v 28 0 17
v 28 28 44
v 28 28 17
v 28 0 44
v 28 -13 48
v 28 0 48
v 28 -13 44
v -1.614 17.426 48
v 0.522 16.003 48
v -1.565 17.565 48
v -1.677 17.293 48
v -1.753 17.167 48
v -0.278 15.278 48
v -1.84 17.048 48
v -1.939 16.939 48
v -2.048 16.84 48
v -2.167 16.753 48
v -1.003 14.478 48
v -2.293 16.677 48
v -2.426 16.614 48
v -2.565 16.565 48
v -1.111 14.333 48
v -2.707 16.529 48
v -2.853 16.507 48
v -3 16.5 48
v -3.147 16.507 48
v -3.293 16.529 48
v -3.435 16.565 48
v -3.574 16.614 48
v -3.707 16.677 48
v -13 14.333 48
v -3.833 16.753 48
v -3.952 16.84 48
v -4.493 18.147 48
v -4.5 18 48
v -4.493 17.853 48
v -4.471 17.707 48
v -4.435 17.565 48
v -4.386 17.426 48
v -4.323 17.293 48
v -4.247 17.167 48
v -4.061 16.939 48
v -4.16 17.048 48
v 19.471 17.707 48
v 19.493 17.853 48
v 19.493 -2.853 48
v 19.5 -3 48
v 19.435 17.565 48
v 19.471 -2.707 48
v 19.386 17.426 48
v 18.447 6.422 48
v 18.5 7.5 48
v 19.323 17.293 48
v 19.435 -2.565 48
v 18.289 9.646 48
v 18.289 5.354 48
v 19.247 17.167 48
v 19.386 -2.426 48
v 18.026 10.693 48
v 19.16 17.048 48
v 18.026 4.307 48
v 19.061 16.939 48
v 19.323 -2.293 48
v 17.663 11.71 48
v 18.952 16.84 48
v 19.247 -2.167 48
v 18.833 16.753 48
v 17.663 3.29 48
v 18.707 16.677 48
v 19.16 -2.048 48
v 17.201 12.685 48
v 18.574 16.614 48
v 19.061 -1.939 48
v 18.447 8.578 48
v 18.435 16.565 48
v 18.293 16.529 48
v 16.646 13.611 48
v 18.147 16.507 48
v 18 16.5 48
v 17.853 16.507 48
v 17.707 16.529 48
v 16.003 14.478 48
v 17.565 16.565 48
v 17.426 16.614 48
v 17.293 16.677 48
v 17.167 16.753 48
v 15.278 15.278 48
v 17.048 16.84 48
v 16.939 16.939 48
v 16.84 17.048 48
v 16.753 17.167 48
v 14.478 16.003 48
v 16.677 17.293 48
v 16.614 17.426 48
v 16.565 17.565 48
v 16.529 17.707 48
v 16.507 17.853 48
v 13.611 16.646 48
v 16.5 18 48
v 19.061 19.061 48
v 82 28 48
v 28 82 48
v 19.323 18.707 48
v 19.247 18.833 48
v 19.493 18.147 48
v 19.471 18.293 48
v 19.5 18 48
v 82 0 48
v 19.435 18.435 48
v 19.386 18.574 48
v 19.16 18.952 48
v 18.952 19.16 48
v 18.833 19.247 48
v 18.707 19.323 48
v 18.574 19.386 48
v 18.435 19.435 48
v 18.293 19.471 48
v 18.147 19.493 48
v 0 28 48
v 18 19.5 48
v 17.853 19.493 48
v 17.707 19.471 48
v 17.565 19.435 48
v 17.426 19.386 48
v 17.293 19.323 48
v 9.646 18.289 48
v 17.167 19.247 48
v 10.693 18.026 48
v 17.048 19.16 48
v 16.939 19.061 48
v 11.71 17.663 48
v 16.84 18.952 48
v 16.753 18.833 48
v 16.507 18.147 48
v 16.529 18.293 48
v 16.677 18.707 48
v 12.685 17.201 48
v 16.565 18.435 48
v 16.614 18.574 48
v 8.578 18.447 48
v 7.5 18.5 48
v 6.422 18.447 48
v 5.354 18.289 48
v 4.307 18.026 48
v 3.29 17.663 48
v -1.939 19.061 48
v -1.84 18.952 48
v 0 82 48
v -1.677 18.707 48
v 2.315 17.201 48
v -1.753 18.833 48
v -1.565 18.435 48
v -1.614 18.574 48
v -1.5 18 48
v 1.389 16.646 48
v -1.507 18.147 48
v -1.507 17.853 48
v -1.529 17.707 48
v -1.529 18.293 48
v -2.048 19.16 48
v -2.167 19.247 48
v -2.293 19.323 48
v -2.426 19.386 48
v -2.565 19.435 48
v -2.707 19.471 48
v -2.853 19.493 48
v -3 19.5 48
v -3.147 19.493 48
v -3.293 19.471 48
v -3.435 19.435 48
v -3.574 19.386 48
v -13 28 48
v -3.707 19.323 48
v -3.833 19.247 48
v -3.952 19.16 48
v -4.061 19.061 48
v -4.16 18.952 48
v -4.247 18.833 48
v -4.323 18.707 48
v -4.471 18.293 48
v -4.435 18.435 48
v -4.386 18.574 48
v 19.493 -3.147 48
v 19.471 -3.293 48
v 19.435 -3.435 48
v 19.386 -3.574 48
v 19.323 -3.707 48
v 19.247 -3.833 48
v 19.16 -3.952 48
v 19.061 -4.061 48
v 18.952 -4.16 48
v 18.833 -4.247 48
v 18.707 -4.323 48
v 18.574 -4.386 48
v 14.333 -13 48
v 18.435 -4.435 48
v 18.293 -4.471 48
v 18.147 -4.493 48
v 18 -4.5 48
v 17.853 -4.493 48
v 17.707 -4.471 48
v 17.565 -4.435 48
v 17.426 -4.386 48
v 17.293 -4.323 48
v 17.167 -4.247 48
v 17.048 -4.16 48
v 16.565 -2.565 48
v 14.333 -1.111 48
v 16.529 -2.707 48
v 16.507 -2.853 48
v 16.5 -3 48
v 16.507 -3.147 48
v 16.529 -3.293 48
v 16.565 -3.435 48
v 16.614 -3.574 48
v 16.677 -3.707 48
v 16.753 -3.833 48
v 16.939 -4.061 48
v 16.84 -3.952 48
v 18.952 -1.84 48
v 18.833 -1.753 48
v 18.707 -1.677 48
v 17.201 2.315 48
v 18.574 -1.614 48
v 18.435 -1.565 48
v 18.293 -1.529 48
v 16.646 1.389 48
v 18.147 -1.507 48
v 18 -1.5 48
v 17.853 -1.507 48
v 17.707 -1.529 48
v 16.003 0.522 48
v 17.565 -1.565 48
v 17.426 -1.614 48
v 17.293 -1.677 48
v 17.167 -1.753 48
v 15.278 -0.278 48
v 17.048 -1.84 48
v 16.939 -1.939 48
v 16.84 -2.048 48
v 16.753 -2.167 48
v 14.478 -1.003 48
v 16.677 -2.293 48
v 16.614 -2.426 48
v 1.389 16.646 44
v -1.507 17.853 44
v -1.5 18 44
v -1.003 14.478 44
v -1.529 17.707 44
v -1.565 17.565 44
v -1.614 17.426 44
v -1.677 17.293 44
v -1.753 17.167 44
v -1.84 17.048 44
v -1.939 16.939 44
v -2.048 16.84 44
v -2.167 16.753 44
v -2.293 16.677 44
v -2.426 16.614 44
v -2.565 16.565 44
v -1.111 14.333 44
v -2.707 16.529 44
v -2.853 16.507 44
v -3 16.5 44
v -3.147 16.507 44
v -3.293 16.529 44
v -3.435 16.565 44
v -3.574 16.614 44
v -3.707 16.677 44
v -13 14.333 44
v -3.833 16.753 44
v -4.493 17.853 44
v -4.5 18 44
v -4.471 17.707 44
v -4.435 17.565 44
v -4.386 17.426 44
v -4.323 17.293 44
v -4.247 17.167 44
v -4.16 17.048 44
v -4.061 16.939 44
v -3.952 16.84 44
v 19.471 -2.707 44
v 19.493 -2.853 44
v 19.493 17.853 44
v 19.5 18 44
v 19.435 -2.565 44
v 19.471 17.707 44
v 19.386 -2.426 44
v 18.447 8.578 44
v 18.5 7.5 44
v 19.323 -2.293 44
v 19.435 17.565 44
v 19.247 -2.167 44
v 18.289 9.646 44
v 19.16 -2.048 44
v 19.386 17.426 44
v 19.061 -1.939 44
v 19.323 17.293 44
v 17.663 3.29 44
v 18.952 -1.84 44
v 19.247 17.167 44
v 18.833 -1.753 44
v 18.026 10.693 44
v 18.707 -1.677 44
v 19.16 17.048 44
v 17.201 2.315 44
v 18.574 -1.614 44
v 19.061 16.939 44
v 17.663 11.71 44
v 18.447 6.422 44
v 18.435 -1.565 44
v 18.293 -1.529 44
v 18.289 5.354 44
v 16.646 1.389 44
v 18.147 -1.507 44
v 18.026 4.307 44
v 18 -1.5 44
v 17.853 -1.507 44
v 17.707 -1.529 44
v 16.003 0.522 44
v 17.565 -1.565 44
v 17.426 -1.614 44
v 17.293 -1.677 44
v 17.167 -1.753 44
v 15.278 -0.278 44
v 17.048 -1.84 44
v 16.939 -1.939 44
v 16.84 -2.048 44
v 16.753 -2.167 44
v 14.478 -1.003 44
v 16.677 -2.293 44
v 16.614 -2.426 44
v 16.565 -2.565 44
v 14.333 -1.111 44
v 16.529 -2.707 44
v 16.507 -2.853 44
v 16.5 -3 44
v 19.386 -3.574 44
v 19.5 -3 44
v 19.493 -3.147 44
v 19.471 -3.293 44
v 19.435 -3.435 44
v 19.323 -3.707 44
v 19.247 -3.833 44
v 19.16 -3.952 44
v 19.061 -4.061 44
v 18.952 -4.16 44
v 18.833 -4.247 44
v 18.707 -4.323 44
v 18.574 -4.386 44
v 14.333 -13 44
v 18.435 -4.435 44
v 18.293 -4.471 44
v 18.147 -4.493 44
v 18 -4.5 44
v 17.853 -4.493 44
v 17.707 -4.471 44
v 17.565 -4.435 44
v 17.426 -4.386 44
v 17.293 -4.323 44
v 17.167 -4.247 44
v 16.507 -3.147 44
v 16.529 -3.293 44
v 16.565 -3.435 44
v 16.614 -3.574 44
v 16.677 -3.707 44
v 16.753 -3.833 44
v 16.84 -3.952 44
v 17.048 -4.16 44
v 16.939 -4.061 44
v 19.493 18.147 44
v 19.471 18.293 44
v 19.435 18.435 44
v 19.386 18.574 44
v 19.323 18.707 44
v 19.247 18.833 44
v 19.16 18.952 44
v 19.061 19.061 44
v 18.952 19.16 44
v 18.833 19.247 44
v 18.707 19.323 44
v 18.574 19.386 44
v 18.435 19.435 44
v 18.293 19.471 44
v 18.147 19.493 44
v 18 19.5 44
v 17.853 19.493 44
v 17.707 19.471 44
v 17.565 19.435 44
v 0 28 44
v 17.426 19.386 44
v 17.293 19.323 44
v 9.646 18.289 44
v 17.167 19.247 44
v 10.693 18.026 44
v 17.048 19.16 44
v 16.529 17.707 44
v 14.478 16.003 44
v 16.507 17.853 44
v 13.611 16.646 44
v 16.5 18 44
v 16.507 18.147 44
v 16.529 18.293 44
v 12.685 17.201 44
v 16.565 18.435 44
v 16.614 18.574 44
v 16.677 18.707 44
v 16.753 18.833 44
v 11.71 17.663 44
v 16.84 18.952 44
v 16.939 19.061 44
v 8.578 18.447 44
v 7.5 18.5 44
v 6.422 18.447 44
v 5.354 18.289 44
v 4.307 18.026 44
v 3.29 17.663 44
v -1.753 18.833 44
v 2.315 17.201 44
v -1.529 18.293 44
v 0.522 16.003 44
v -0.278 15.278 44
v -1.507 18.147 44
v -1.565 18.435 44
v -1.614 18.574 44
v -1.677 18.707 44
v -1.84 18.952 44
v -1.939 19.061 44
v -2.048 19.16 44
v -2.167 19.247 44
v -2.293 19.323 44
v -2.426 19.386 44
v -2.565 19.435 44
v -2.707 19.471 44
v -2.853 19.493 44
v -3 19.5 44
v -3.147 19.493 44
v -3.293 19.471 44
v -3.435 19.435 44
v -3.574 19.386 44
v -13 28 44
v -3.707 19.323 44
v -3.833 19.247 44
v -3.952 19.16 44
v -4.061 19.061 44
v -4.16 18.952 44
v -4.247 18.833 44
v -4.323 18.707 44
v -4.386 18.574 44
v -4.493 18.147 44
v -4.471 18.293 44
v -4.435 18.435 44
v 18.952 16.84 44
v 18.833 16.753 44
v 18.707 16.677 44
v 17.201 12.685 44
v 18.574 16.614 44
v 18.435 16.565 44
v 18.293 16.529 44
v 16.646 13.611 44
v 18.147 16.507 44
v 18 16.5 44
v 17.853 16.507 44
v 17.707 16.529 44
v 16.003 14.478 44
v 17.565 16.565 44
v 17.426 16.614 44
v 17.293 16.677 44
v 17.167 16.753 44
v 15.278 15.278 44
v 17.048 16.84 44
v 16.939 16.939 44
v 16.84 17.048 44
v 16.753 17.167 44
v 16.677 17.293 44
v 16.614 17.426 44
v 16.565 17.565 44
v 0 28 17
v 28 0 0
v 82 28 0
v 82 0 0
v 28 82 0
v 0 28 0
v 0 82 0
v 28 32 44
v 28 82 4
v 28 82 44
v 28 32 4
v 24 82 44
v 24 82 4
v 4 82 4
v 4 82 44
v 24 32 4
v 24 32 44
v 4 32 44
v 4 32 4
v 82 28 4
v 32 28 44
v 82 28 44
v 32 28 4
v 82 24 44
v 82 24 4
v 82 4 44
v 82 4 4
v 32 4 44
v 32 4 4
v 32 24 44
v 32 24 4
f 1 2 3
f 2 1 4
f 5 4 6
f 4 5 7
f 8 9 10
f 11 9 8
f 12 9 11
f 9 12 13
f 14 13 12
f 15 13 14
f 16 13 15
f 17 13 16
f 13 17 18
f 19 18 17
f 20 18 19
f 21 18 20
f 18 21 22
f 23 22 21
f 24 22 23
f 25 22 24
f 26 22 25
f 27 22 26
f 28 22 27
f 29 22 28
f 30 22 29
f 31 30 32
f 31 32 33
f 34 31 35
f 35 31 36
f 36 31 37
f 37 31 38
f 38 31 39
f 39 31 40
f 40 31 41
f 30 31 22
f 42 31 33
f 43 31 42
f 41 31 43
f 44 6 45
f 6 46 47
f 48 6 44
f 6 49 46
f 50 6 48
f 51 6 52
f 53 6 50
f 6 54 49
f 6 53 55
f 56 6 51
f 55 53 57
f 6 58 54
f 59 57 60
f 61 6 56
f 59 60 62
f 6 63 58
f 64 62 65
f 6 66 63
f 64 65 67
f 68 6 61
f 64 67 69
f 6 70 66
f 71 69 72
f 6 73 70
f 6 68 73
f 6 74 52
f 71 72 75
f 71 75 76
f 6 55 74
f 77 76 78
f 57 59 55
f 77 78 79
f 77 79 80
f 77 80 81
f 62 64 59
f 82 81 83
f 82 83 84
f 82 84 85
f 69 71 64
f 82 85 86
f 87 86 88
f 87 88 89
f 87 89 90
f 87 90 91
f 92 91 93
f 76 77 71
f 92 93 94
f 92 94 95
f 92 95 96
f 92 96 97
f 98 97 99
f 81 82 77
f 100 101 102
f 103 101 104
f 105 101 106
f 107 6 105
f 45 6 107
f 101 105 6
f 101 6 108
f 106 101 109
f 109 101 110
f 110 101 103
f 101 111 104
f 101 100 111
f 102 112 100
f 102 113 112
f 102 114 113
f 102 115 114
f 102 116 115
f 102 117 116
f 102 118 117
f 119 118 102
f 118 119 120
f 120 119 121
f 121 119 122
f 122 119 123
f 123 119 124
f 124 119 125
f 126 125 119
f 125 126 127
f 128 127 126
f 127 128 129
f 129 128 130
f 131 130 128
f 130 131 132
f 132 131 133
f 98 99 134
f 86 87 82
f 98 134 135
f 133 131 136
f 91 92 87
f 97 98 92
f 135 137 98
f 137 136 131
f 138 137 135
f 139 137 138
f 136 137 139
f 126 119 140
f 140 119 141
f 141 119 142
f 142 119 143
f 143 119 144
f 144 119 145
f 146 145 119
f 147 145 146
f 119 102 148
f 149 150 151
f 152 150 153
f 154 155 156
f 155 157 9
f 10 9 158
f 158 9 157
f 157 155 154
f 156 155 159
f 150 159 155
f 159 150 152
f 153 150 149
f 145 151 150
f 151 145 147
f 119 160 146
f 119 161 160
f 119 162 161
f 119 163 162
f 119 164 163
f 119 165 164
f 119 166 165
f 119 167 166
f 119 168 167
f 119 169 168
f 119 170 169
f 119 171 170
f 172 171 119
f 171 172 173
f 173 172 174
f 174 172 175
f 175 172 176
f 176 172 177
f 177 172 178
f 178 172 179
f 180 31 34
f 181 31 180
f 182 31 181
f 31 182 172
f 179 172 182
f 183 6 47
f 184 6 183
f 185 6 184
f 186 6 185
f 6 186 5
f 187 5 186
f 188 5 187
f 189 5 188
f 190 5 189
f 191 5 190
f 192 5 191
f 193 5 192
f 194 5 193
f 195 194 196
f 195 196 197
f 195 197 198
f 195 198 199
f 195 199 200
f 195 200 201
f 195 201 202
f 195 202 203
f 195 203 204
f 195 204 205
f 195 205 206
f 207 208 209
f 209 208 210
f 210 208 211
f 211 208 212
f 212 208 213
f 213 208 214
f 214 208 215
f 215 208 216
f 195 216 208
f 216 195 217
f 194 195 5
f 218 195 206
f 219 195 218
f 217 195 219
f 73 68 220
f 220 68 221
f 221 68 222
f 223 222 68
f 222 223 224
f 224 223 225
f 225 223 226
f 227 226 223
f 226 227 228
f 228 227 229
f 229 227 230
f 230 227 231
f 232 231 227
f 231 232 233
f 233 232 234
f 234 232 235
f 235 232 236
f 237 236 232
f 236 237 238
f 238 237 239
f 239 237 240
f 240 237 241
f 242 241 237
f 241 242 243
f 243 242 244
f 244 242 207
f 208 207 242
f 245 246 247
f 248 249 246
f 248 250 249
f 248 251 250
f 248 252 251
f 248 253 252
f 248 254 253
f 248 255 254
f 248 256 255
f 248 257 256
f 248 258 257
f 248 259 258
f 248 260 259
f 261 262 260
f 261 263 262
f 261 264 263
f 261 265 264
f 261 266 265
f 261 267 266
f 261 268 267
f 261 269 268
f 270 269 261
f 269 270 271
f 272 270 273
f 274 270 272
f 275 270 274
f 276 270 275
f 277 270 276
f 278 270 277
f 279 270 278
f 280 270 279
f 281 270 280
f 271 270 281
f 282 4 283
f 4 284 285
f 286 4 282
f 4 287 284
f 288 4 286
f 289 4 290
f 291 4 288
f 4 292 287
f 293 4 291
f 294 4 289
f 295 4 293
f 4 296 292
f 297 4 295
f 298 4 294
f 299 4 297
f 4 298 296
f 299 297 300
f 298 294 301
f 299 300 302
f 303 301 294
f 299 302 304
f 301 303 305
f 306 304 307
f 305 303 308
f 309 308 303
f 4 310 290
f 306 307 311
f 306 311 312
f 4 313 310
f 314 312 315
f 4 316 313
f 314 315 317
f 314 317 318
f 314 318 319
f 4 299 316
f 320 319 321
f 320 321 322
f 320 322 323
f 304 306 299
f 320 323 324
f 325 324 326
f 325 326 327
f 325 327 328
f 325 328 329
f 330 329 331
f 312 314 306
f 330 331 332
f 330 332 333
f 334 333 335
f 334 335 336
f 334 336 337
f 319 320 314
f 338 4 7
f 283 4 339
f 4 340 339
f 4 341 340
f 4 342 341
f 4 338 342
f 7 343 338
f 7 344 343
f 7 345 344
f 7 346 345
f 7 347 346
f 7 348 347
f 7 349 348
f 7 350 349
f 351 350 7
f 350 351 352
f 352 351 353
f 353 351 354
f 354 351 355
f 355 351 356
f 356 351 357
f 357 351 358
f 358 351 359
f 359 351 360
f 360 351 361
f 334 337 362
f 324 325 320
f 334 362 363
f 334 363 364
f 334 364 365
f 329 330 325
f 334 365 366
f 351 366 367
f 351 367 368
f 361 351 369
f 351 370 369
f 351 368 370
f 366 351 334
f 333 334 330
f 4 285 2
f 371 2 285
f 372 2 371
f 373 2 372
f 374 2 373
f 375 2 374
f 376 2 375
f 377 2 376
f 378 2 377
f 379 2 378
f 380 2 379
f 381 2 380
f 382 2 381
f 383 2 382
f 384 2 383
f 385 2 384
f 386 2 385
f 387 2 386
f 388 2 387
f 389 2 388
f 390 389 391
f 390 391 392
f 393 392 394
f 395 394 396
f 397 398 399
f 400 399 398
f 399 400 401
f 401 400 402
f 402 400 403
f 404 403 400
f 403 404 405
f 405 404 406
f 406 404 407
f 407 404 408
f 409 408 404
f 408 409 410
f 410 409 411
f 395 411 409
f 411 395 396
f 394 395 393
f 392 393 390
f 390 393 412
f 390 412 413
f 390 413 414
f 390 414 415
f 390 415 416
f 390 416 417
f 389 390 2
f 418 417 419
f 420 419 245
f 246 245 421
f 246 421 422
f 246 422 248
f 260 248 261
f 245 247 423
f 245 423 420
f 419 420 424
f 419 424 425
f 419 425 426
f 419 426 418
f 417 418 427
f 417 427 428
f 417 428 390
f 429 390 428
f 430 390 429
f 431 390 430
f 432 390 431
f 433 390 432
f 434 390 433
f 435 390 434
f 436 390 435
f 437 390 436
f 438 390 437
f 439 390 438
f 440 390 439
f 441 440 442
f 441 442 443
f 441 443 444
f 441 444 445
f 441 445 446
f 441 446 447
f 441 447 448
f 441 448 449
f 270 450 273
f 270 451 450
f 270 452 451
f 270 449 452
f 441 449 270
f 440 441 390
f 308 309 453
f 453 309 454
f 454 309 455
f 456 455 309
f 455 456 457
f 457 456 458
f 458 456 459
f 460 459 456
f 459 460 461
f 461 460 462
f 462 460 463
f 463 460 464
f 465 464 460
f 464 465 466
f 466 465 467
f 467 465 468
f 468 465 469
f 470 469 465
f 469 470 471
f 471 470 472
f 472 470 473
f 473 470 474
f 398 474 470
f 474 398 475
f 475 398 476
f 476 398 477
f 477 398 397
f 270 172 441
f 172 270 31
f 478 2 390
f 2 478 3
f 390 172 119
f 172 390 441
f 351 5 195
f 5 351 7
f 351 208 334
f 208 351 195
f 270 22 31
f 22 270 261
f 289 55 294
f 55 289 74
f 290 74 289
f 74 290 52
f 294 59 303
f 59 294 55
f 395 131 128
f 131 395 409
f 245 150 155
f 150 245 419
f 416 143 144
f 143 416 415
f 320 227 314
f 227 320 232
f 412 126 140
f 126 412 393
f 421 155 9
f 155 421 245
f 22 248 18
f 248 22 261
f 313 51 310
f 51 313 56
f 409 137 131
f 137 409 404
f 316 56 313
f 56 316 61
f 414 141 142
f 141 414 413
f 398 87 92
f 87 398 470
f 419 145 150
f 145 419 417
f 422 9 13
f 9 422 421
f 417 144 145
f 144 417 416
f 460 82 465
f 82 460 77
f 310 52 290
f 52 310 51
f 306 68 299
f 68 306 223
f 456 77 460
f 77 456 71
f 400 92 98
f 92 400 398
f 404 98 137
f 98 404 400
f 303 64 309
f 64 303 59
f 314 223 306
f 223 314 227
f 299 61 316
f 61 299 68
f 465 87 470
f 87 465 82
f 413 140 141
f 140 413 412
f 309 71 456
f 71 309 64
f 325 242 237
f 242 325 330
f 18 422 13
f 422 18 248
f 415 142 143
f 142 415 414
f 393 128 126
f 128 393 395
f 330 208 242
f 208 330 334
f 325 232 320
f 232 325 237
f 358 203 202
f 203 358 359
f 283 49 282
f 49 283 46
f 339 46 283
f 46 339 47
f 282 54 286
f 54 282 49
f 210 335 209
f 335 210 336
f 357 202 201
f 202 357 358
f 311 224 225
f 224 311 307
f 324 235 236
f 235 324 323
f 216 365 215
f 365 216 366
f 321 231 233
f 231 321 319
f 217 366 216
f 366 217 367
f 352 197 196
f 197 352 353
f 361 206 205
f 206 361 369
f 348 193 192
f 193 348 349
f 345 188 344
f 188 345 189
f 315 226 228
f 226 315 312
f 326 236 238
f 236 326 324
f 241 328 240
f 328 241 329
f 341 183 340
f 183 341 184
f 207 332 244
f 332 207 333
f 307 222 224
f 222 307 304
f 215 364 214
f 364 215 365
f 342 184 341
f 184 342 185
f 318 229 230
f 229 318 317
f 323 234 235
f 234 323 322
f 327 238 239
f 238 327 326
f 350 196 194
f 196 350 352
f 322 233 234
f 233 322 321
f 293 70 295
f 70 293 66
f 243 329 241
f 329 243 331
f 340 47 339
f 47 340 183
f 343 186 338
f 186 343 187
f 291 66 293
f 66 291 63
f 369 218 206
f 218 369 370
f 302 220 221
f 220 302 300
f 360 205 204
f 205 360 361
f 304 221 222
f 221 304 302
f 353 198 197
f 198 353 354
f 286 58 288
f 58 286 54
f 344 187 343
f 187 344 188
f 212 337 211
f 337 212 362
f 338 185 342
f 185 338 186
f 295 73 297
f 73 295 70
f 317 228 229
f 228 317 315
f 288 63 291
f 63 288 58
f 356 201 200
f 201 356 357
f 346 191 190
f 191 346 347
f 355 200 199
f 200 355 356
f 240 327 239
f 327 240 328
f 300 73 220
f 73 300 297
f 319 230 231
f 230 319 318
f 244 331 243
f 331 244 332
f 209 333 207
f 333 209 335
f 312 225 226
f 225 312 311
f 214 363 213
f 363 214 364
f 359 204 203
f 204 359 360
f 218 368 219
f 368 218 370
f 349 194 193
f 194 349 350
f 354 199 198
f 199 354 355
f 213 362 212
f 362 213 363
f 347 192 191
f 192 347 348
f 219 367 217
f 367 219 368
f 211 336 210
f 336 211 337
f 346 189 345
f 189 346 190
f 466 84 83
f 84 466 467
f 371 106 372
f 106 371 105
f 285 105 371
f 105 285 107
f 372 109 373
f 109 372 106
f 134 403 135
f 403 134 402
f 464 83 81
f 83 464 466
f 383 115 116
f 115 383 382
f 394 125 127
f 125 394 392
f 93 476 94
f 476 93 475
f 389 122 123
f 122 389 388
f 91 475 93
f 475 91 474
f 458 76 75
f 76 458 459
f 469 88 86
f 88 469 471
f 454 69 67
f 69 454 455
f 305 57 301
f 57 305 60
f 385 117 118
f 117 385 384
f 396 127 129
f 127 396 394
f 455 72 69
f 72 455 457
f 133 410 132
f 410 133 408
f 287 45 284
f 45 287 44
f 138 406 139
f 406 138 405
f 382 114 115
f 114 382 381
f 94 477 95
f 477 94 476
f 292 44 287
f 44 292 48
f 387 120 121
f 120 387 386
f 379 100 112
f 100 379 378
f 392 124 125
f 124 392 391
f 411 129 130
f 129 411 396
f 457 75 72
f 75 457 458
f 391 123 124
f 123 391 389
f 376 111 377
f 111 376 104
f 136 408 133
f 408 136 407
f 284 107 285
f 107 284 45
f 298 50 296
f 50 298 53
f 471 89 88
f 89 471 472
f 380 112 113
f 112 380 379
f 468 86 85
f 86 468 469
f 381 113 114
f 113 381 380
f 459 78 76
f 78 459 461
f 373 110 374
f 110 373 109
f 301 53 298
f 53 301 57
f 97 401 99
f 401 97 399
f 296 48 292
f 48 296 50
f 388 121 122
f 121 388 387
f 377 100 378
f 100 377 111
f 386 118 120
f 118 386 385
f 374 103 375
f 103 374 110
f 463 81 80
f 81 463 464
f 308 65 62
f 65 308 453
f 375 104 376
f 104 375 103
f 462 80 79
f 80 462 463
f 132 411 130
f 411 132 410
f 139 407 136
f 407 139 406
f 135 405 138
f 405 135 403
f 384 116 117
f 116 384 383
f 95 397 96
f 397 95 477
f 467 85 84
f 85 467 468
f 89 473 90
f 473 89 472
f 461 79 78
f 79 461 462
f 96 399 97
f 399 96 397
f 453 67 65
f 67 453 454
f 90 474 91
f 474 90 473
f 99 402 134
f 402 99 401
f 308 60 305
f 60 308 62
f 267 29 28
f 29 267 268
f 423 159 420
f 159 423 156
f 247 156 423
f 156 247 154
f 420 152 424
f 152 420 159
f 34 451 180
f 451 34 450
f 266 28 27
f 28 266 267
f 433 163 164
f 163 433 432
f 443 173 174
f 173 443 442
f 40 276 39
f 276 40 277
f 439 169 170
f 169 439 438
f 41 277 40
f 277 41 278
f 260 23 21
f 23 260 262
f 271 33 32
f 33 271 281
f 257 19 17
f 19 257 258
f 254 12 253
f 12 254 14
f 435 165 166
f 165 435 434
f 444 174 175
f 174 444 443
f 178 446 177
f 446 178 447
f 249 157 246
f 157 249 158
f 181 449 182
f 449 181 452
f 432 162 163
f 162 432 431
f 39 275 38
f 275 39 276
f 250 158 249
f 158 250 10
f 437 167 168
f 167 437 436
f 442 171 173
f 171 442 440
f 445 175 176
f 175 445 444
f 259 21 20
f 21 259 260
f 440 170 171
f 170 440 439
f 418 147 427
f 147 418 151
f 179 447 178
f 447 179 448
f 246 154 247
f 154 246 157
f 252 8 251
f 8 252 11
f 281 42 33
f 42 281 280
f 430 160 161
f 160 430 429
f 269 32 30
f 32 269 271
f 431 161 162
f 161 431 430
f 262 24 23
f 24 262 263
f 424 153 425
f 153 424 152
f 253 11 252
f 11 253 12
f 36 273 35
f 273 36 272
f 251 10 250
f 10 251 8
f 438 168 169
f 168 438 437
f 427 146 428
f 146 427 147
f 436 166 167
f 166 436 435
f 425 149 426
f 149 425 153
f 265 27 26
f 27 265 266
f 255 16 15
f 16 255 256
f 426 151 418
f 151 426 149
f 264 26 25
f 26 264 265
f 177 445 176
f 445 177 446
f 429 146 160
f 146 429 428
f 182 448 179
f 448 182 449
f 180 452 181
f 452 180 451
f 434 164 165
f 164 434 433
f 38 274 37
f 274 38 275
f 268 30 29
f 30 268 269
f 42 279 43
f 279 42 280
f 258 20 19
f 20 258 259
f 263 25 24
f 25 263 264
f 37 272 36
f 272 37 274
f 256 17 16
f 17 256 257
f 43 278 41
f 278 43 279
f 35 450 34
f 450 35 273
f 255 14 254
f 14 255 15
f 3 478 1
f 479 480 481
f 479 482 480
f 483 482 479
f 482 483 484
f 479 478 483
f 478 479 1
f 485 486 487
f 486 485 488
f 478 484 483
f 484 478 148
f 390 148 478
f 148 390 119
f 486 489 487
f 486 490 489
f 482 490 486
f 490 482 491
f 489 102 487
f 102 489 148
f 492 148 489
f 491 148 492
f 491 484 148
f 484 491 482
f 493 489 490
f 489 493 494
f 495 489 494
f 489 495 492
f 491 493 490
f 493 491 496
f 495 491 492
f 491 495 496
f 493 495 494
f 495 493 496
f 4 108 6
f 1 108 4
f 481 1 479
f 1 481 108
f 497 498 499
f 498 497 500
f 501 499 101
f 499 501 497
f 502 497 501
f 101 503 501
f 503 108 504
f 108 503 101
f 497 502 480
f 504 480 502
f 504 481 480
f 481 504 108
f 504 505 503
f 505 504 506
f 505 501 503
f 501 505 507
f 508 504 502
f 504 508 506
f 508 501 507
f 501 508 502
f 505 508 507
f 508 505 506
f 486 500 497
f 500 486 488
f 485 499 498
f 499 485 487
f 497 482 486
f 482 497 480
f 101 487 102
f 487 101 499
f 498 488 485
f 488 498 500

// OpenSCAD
// file: variables.scad
//Universal 
$fn= $preview ? 32 : 64;
tolerance = 0.4; //play for EASY fit
wallThickness = 4;
cutOut = 0.2;

//dimention of extrusion aluminium profile
extrusionHeight = 40;
extrusionWidth = 20;
extrusionDepth = 50;

//extrusionSlotMetrics
extrusionSlotOffset = 6.9;
extrusionSlotWidth = 6.2;
extrusionSlotMid = 13.7;

//dimention of extrusion aluminium and walls
outerExtrusionHeight = extrusionHeight+wallThickness*2;
outerExtrusionWidth = extrusionWidth+wallThickness*2;
outerExtrusionDepth = extrusionDepth+wallThickness;

//inner support
frontSupportThickness = extrusionHeight/10;
innerSupportDifference = sqrt(2)*outerExtrusionDepth;

//outer support
outerSupportDifference = sqrt(2)*outerExtrusionWidth;

//stepper Motor
stepperMotorHight = 31;
stepperMotorWidth = 41;
stepperMotorScrewDiameter = 3;
stepperMotorShaftDiameter = 22;
stepperThreadOffset = 10;
stepperMotorMountThickness = 4;
// main file
include <variables.scad>;

module extrusionSleevePrimitive(){
	
	difference(){
		
		cube([outerExtrusionWidth, outerExtrusionDepth, outerExtrusionHeight], false);
		
		translate([wallThickness,wallThickness,wallThickness]){
			
			cube([extrusionWidth, extrusionDepth+cutOut, extrusionHeight], false);
			
		}
		
	}                                               
		
}

module extrusionSleevePair(){
	
	translate([0,outerExtrusionWidth,0]){
		
		extrusionSleevePrimitive();
		
		translate([outerExtrusionWidth,0,0]){
		
			rotate([0,0,-90]){
			
				extrusionSleevePrimitive();
			
			}
			
		}
		
	}
	
}

module jointInnerSupportPrimitive(){
	
	difference(){
                
		union(){
                    
			translate([0,0,0]){   
                        
				cube([outerExtrusionDepth,outerExtrusionDepth,frontSupportThickness],false);
                        
			}
                        
			translate([0,0,outerExtrusionHeight-frontSupportThickness]){
                        
				cube([outerExtrusionDepth,outerExtrusionDepth,frontSupportThickness],false);
					
			}
                        
		}
            
		rotate([0,0,45]){
                    
			translate([0,0,-cutOut/2]){
                        
				cube([innerSupportDifference,innerSupportDifference,outerExtrusionHeight+cutOut],false);
                        
			}
                    
		} 
                
	}
	
	translate([outerExtrusionDepth,0,0]){
        
		rotate([0,0,90]){
			
			difference(){
                
				cube([wallThickness,wallThickness,outerExtrusionHeight],false);
                
				translate([wallThickness,wallThickness,outerExtrusionHeight/2]){
                    
					rotate([0,0,45]){
							
						cube([sqrt(2)*wallThickness,sqrt(2)*wallThickness,outerExtrusionHeight+cutOut],true);
						
					}
				
				}
				
			}
			
		}
		
	}
	
}

module jointInnerSupport(){
	
	translate([outerExtrusionWidth,outerExtrusionWidth+outerExtrusionDepth,0]){
		
		rotate([0,0,-90]){
		
			jointInnerSupportPrimitive();
			
		}
		
	}
	
}

module jointOuterSupportPrimitive(hasStepperMotorCutout){
	
	if (hasStepperMotorCutout==true){
		
		translate([outerExtrusionWidth/2,outerExtrusionWidth/2,outerExtrusionHeight/2-stepperMotorHight/2]){
			
            difference(){
                
                cube([outerExtrusionWidth, outerExtrusionWidth, outerExtrusionHeight-stepperMotorHight], true);

                rotate([0,0,-135]){

                    translate([outerSupportDifference/2, 0, 0]){

                        cube([outerSupportDifference, outerSupportDifference, outerExtrusionHeight+cutOut], true);

                    }

				}

			} 

		}
		
	}
	
	else{
		
		translate([outerExtrusionWidth/2,outerExtrusionWidth/2,outerExtrusionHeight/2]){
			
            difference(){
                
                cube([outerExtrusionWidth, outerExtrusionWidth, outerExtrusionHeight], true);

                rotate([0,0,-135]){

                    translate([outerSupportDifference/2, 0, 0]){

                        cube([outerSupportDifference, outerSupportDifference, outerExtrusionHeight+cutOut], true);
						
					}
					
				}

			} 

		}	
		
	}
	
}

module stepperMountPrimitive(){
	
	difference(){
                
		cube([stepperMotorWidth,stepperMotorWidth,stepperMotorMountThickness],false);
            
		translate([-stepperMotorWidth/3,-stepperMotorWidth/3,-cutOut/2]){
                    
			cube([stepperMotorWidth,stepperMotorWidth,stepperMotorMountThickness+cutOut]);
			
		}
            
		translate([stepperMotorWidth/2,stepperMotorWidth/2,-cutOut/2]){
                    
            cylinder(stepperMotorMountThickness+cutOut,d=stepperMotorShaftDiameter,false);
		
		}
            
		translate([stepperMotorWidth-stepperThreadOffset,stepperMotorWidth-31,0]){
                    
            cylinder(stepperMotorMountThickness+cutOut,d=stepperMotorScrewDiameter,false );
			
		}
                    
        translate([stepperMotorWidth-stepperThreadOffset,stepperMotorWidth-stepperThreadOffset,0]){
			
            cylinder(stepperMotorMountThickness+cutOut,d=stepperMotorScrewDiameter,false);
			
		}
                    
        translate([stepperMotorWidth-31,stepperMotorWidth-stepperThreadOffset,0]){
                    
            cylinder(stepperMotorMountThickness+cutOut,d=stepperMotorScrewDiameter,false);
		}
                    
	}
	
}

module stepperMount();{
	
	translate([-stepperMotorWidth+outerExtrusionWidth,-stepperMotorWidth+outerExtrusionWidth,outerExtrusionHeight-	stepperMotorMountThickness]){
		
		stepperMountPrimitive();
		
	}	
	
}


jointOuterSupportPrimitive(true);

extrusionSleevePair();

jointInnerSupport();
